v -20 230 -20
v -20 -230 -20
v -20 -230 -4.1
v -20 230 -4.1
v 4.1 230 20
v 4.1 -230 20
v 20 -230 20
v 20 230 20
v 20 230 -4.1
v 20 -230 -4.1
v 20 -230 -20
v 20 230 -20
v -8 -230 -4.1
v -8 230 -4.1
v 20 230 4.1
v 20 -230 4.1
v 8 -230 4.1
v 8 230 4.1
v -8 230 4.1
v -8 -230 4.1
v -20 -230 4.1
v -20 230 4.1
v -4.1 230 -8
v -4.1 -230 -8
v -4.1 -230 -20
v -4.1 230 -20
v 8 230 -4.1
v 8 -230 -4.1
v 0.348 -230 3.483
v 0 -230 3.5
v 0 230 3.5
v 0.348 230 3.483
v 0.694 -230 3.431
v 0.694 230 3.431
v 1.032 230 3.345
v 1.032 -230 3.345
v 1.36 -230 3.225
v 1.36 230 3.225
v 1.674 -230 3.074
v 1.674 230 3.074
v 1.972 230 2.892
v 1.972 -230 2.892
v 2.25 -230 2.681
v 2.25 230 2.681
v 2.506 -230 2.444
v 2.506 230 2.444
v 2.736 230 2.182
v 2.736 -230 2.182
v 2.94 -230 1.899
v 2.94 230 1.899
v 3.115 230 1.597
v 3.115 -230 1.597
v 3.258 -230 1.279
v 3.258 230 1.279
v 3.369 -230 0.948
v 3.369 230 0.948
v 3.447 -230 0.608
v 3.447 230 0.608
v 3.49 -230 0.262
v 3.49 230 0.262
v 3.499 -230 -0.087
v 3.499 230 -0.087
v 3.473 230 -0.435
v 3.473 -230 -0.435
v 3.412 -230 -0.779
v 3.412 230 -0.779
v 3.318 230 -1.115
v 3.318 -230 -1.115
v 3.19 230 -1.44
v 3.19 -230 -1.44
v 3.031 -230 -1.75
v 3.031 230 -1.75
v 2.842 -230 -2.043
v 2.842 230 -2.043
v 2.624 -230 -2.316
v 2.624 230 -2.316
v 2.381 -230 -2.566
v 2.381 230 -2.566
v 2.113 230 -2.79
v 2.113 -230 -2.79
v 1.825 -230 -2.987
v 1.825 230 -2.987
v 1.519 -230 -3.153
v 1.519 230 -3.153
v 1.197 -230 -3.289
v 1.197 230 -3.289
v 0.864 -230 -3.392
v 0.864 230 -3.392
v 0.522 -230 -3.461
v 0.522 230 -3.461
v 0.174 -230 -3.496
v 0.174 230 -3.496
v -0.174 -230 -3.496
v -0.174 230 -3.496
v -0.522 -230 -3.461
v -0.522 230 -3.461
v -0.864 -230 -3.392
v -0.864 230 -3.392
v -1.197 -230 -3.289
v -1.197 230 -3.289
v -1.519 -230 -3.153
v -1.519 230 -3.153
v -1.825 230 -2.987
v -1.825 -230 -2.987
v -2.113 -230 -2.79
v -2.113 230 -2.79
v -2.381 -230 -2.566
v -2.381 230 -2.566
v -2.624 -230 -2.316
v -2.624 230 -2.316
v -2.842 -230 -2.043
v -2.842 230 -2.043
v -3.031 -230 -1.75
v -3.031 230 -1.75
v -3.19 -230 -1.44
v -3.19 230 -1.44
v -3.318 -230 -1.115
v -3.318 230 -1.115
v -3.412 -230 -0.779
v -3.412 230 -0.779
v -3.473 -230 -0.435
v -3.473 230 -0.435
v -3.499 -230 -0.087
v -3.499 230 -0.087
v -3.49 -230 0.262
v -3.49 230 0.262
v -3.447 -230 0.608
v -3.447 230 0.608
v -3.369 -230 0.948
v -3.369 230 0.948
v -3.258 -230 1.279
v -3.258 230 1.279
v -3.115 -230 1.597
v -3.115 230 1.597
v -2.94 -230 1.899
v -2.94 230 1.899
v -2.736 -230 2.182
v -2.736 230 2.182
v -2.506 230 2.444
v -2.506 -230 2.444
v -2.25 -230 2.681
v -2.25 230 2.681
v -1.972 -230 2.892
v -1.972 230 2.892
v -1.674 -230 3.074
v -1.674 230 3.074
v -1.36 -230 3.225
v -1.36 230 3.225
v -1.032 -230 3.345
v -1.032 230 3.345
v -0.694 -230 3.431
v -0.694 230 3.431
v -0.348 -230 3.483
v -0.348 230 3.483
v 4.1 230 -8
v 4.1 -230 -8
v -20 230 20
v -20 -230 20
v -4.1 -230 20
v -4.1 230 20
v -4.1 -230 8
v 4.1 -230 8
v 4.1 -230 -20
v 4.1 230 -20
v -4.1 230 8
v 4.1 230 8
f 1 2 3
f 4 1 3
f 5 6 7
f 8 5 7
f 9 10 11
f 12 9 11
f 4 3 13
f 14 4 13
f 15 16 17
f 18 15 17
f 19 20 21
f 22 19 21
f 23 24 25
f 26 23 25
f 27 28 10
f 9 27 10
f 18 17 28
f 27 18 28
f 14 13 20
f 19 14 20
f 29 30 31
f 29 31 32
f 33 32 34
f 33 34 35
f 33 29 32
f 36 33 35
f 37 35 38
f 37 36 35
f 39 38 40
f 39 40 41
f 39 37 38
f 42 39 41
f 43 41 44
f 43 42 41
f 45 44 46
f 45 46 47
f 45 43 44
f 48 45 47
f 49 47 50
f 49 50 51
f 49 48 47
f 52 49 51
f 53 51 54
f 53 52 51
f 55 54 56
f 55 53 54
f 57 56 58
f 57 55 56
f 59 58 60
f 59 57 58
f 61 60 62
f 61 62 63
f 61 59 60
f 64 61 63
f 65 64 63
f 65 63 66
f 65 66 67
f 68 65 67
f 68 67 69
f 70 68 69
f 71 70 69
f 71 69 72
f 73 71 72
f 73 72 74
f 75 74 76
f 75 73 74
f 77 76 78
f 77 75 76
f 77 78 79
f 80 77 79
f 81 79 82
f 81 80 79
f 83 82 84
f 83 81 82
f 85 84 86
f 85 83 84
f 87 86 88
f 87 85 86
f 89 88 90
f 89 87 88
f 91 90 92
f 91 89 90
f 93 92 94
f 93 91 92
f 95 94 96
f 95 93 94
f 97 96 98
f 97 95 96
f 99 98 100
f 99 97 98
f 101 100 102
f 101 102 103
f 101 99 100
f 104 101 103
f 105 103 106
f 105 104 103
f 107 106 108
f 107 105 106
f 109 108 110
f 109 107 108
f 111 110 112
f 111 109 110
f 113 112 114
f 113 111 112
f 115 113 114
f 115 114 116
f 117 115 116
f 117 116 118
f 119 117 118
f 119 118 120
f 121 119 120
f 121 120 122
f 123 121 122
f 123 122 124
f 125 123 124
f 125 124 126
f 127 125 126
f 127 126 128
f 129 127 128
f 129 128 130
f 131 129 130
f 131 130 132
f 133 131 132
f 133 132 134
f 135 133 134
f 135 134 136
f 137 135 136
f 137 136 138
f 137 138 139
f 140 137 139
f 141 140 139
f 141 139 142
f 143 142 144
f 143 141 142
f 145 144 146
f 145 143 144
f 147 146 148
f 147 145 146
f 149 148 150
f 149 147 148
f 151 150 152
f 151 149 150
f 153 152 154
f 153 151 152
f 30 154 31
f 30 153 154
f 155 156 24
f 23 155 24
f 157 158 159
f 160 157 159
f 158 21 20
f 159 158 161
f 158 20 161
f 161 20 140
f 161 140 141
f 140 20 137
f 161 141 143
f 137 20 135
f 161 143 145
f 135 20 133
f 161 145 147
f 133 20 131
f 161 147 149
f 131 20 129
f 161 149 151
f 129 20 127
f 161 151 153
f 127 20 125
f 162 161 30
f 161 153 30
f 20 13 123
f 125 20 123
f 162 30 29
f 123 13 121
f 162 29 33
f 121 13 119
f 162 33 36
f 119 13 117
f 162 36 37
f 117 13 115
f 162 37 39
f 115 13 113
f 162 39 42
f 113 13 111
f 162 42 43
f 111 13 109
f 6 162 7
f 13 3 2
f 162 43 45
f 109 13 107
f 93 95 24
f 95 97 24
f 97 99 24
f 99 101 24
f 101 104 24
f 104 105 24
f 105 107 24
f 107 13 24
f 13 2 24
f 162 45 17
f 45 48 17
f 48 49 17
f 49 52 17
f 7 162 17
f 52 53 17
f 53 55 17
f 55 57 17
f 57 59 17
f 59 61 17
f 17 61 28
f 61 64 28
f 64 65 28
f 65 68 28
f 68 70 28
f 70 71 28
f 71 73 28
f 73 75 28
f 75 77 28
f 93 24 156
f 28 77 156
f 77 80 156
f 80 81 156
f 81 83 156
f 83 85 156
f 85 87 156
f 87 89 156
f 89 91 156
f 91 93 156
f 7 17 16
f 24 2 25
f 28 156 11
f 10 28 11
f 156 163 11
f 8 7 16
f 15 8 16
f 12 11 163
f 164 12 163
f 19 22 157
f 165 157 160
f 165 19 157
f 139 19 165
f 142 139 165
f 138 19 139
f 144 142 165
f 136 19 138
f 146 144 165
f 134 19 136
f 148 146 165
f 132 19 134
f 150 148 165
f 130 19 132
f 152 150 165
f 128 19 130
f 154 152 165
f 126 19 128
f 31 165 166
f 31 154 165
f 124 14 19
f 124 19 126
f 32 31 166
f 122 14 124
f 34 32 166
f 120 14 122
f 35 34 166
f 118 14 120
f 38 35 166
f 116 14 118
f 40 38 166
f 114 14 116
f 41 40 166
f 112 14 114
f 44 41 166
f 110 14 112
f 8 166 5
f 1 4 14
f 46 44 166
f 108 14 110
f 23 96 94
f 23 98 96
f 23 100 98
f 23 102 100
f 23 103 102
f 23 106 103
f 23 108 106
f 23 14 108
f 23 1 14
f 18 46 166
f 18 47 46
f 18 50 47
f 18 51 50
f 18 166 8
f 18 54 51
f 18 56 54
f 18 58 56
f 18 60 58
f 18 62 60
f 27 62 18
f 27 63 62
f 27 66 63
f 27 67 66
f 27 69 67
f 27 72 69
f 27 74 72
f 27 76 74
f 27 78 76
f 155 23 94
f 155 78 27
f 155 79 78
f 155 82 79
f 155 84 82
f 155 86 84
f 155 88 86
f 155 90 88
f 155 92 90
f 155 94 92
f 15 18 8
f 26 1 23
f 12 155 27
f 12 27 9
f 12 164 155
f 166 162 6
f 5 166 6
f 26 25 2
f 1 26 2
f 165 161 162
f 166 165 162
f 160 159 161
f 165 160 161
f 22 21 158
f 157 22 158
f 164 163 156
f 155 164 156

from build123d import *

# Parameters (mm, degrees)
AUFSATZ_LINEAR_AUSTRAGEN1_DEPTH      = 230
AUFSATZ_LINEAR_AUSTRAGEN1_DEPTH_BACK = 230
SKIZZE1_R                            = 3.5


with BuildPart() as part:
    # Skizze1 → Aufsatz-Linear austragen1 (new, two sides: drawn at the far end of the back side and taken through both)
    with BuildSketch(Plane(origin=(0, 0, 0), x_dir=(1, 0, 0), z_dir=(0, 1, 0)).offset(-AUFSATZ_LINEAR_AUSTRAGEN1_DEPTH_BACK)):
        Polygon((-4.1, -20), (-4.1, -8), (4.1, -8), (4.1, -20), (20, -20), (20, -4.1), (8, -4.1), (8, 4.1), (20, 4.1), (20, 20), (4.1, 20), (4.1, 8), (-4.1, 8), (-4.1, 20), (-20, 20), (-20, 4.1), (-8, 4.1), (-8, -4.1), (-20, -4.1), (-20, -20), align=None)
        Circle(SKIZZE1_R, mode=Mode.SUBTRACT)
    extrude(amount=AUFSATZ_LINEAR_AUSTRAGEN1_DEPTH + AUFSATZ_LINEAR_AUSTRAGEN1_DEPTH_BACK)


solid = part.part
